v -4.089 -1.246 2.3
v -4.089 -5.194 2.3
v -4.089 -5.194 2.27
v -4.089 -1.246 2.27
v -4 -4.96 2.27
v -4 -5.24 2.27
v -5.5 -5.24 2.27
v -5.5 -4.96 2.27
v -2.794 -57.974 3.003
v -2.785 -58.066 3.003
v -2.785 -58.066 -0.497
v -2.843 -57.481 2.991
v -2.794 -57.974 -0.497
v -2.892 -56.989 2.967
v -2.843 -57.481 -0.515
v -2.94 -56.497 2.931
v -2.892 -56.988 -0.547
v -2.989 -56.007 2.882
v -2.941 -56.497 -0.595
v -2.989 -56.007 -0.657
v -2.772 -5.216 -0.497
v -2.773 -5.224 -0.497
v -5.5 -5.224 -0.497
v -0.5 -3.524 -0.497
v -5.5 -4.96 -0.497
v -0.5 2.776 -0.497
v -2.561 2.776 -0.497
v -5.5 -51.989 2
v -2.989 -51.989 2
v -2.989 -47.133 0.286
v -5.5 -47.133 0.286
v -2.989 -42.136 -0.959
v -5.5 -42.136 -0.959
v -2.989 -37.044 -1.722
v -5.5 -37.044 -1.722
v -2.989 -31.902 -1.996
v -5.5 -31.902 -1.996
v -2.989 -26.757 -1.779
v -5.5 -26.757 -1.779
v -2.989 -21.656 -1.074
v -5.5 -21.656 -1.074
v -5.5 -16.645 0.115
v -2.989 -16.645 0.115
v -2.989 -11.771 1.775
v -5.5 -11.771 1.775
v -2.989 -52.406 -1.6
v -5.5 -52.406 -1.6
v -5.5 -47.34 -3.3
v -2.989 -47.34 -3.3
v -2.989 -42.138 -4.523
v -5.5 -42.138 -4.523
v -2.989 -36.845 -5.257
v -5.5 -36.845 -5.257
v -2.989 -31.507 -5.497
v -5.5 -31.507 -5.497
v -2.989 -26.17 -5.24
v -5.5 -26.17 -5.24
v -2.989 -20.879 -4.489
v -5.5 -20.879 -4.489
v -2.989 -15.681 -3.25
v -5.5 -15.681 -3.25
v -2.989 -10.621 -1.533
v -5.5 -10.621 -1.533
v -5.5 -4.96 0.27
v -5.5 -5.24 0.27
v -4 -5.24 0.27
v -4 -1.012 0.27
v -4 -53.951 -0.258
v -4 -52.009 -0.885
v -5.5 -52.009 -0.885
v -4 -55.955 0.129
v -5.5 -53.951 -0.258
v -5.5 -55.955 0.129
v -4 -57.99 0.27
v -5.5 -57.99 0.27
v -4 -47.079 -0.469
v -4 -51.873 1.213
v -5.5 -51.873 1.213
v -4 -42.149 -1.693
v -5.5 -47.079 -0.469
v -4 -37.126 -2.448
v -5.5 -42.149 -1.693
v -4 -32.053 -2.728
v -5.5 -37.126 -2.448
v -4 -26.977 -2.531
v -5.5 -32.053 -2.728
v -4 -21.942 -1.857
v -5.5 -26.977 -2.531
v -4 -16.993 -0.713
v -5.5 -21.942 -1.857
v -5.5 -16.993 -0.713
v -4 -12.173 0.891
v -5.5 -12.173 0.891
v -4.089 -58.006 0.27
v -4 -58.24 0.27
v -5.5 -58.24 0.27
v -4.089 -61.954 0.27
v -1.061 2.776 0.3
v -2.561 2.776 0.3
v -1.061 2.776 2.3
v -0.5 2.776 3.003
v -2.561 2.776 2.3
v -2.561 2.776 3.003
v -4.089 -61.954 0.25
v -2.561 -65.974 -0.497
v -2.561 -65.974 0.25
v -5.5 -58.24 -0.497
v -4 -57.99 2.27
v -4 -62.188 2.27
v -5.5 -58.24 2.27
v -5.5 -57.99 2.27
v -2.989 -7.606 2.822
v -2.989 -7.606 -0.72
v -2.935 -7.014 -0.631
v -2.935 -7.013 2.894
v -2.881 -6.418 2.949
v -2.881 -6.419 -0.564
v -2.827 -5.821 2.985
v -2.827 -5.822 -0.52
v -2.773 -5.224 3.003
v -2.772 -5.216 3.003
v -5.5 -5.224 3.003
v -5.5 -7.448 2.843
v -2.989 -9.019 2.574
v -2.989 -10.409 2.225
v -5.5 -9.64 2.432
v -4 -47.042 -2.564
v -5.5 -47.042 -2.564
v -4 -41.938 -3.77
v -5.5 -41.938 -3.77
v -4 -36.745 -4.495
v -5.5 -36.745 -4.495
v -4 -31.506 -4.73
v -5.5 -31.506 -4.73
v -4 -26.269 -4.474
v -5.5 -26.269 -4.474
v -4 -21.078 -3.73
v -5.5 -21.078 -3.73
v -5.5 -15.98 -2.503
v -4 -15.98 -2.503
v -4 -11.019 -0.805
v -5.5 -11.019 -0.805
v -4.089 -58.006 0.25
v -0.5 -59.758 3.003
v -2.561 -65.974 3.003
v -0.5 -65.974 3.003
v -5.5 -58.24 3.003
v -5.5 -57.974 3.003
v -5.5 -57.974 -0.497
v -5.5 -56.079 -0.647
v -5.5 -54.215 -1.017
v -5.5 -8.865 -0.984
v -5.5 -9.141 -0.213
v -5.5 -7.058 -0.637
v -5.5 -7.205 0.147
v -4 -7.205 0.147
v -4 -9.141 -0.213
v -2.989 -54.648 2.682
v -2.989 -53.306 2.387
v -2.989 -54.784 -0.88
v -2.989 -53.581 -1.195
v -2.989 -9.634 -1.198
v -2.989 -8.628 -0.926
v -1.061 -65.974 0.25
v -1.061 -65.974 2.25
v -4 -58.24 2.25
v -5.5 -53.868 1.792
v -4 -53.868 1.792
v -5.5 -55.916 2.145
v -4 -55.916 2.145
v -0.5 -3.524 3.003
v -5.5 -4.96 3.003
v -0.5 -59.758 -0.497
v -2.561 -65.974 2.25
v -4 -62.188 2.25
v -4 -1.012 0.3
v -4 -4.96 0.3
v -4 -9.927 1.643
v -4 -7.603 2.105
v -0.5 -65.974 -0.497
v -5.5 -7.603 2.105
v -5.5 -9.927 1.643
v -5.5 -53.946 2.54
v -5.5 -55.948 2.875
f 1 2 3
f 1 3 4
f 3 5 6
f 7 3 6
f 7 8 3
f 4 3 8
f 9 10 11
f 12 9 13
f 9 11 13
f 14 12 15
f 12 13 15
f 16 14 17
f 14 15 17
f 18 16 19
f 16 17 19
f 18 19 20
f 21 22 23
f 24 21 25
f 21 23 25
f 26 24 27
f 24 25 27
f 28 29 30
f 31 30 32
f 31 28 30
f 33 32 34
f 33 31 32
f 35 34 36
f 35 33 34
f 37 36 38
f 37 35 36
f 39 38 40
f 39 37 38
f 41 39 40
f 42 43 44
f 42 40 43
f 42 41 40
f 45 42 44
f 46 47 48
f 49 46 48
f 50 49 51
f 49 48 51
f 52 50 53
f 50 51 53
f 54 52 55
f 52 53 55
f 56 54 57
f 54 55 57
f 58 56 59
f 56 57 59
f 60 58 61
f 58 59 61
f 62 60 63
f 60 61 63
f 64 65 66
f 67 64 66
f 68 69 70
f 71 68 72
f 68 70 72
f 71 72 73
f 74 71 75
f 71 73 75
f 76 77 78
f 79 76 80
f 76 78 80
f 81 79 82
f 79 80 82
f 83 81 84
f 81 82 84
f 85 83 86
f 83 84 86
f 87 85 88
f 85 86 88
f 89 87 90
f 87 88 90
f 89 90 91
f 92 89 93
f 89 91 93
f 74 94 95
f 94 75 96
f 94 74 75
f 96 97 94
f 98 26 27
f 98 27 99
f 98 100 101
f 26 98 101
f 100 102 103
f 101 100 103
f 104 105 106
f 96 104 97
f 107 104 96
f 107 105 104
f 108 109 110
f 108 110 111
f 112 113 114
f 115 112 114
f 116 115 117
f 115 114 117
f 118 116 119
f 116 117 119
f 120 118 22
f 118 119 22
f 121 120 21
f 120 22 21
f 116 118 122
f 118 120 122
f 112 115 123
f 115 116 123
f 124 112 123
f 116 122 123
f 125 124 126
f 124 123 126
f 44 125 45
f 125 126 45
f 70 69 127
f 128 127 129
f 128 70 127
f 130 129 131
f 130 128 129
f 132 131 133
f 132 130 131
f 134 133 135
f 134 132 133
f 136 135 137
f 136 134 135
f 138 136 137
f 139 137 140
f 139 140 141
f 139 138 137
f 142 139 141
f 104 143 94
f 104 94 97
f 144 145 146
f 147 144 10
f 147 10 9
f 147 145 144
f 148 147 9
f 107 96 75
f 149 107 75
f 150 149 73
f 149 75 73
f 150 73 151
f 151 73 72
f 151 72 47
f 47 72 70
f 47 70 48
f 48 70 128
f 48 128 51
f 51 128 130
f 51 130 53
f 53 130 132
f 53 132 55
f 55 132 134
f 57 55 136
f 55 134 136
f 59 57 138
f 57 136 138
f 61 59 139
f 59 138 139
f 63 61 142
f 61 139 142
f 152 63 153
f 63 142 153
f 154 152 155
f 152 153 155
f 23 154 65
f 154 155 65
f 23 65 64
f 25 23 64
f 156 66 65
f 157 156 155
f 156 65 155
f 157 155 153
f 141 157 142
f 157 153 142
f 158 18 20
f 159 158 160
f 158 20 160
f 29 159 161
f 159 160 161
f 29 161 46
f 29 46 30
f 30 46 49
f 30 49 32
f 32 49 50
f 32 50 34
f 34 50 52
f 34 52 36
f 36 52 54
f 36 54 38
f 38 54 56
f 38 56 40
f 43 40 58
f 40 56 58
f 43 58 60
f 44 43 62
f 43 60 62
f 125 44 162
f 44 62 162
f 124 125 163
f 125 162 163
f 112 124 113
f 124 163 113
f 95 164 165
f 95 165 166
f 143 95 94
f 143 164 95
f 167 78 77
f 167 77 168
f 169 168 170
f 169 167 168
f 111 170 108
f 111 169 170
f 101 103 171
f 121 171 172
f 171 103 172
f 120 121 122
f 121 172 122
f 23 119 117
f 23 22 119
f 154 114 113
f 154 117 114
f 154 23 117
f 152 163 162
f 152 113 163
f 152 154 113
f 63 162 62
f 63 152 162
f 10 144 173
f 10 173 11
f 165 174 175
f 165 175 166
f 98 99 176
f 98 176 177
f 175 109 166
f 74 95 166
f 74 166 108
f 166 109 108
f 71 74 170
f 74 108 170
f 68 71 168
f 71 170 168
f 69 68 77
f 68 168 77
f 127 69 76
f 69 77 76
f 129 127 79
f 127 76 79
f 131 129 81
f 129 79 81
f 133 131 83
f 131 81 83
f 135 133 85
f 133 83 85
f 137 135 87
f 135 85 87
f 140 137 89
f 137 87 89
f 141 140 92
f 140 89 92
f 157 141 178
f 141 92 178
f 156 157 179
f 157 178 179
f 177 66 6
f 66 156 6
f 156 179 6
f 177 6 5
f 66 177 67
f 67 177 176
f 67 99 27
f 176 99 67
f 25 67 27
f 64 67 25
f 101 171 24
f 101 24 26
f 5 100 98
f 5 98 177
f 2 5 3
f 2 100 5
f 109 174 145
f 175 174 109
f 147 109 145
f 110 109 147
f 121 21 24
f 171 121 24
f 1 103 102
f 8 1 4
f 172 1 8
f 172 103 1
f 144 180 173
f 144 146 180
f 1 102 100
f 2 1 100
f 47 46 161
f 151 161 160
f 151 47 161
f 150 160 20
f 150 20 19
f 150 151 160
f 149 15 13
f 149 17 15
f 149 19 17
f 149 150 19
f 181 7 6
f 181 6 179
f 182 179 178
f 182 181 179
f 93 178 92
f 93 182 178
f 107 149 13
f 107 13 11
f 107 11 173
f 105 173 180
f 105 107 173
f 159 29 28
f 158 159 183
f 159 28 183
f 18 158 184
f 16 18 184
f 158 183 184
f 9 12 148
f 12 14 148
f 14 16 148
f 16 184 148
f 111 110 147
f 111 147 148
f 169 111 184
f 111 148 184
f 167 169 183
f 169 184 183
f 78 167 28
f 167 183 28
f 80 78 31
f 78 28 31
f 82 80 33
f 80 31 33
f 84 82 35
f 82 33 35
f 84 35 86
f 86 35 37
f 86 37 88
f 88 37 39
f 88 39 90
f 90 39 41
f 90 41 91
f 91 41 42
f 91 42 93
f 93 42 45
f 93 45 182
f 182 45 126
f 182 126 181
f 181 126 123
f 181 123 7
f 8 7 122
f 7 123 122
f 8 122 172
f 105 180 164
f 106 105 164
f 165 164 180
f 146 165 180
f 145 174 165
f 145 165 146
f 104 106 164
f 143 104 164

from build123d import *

# Parameters (mm, degrees)
EXTRUDE064_DEPTH           = 5
EXTRUDE066_DEPTH           = 5
EXTRUDE066_PLACEMENT_ANGLE = 180
EXTRUDE065_DEPTH           = 2
EXTRUDE065_PLACEMENT_ANGLE = 180
EXTRUDE061_DEPTH           = 2
EXTRUDE063_DEPTH           = 3
EXTRUDE060_DEPTH           = 10
EXTRUDE057_DEPTH           = 5


with BuildPart() as extrude064:
    # Sketch039 → Extrude064 (new body)
    with BuildSketch(Plane.XY):
        Polygon((-0.523418, -66.073971), (-3.588769, -58.006004), (-3.588769, -66.073971), align=None)
    extrude(amount=EXTRUDE064_DEPTH)


with BuildPart() as extrude064_1:
    # Extrude064 placement: moved
    add(extrude064.part.moved(Location((-2, 0, -1))))


with BuildPart() as fusion056:
    # Sketch039 → Extrude066 (new body)
    with BuildSketch(Plane.XY):
        Polygon((-0.523418, -66.073971), (-3.588769, -58.006004), (-3.588769, -66.073971), align=None)
    extrude(amount=EXTRUDE066_DEPTH)


with BuildPart() as fusion056_1:
    # Extrude066 placement: moved
    add(fusion056.part.moved(Location((-2, -63.2, 3.5))).rotate(Axis((-2, -63.2, 3.5), (1, 0, 0)), EXTRUDE066_PLACEMENT_ANGLE))

    # Fusion056: union Extrude064
    add(extrude064_1.part)


with BuildPart() as extrude065:
    # Sketch037 → Extrude065 (new body)
    with BuildSketch(Plane.XY):
        Polygon((-0.523418, -66.073971), (-3.588769, -58.006004), (-3.588769, -66.073971), align=None)
    extrude(amount=EXTRUDE065_DEPTH)


with BuildPart() as extrude065_1:
    # Extrude065 placement: moved
    add(extrude065.part.moved(Location((-0.5, -63.2, 2.45))).rotate(Axis((-0.5, -63.2, 2.45), (1, 0, 0)), EXTRUDE065_PLACEMENT_ANGLE))


with BuildPart() as fusion055:
    # Sketch037 → Extrude061 (new body)
    with BuildSketch(Plane.XY):
        Polygon((-0.523418, -66.073971), (-3.588769, -58.006004), (-3.588769, -66.073971), align=None)
    extrude(amount=EXTRUDE061_DEPTH)


with BuildPart() as fusion055_1:
    # Extrude061 placement: moved
    add(fusion055.part.moved(Location((-0.5, 0, 0.4))))

    # Fusion055: union Extrude065
    add(extrude065_1.part)


with BuildPart() as extrude063:
    # Sketch038 → Extrude063 (new body)
    with BuildSketch(Plane.YZ):
        with BuildLine():
            ThreePointArc((-52.009312, -0.734582), (-31.50638, -4.580156), (-11.018523, -0.655055))
            ThreePointArc((-5.240026, 0.419738), (-8.178332, 0.146093), (-11.018523, -0.655055))
            Line((-5.240026, 0.419738), (2.759974, 0.419738))
            Line((2.759974, 0.419738), (2.759974, 2.419738))
            Line((2.759974, 2.419738), (-5.240026, 2.419738))
            ThreePointArc((-5.240026, 2.419738), (-8.772288, 2.061286), (-12.172965, 1.041109))
            ThreePointArc((-51.872542, 1.363439), (-32.05345, -2.578482), (-12.172965, 1.041109))
            ThreePointArc((-51.872542, 1.363439), (-54.88716, 2.147131), (-57.990026, 2.419738))
            Line((-65.990026, 2.419738), (-57.990026, 2.419738))
            Line((-65.990026, 0.419738), (-65.990026, 2.419738))
            Line((-57.990026, 0.419738), (-65.990026, 0.419738))
            ThreePointArc((-52.009312, -0.734582), (-54.946975, 0.115595), (-57.990026, 0.419738))
        make_face()
    extrude(amount=EXTRUDE063_DEPTH)


with BuildPart() as extrude063_1:
    # Extrude063 placement: moved
    add(extrude063.part.moved(Location((-7, 0, 0))))


with BuildPart() as extrude060:
    # Sketch036 → Extrude060 (new body)
    with BuildSketch(Plane.XY):
        Polygon((-0.489114, -59.765606), (-2.785057, -58.065606), (-2.989114, -56.006916), (-2.989114, -7.606139), (-2.772346, -5.215606), (-0.489114, -3.515606), align=None)
    extrude(amount=EXTRUDE060_DEPTH)


with BuildPart() as extrude060_1:
    # Extrude060 placement: moved
    add(extrude060.part.moved(Location((0, 0, -6))))


with BuildPart() as endverbindung:
    # Sketch033 → Extrude057 (new body)
    with BuildSketch(Plane.YZ):
        with BuildLine():
            ThreePointArc((-52.506138, -1.600172), (-31.607264, -5.496793), (-10.720935, -1.533483))
            ThreePointArc((-5.324033, -0.496866), (-8.066716, -0.784889), (-10.720935, -1.533483))
            Line((-5.324033, -0.496866), (2.675967, -0.496866))
            Line((2.675967, -0.496866), (2.675967, 3.003134))
            Line((2.675967, 3.003134), (-5.324033, 3.003134))
            ThreePointArc((-5.324033, 3.003134), (-8.649812, 2.668233), (-11.870907, 1.7752))
            ThreePointArc((-52.088632, 2.000492), (-32.001526, -1.996019), (-11.870907, 1.7752))
            ThreePointArc((-52.088632, 2.000492), (-55.042543, 2.733373), (-58.074033, 3.003134))
            Line((-66.074033, 3.003134), (-58.074033, 3.003134))
            Line((-66.074033, -0.496866), (-66.074033, 3.003134))
            Line((-58.074033, -0.496866), (-66.074033, -0.496866))
            ThreePointArc((-52.506138, -1.600172), (-55.241791, -0.804798), (-58.074033, -0.496866))
        make_face()
    extrude(amount=EXTRUDE057_DEPTH)


with BuildPart() as endverbindung_1:
    # Extrude057 placement: moved
    add(endverbindung.part.moved(Location((-5.5, 0.1, 0.15))))

    # Cut060: cut Extrude060
    add(extrude060_1.part, mode=Mode.SUBTRACT)

    # Cut061: cut Extrude063
    add(extrude063_1.part, mode=Mode.SUBTRACT)

    # Cut062: cut Fusion055
    add(fusion055_1.part, mode=Mode.SUBTRACT)

    # Cut063: cut Fusion056
    add(fusion056_1.part, mode=Mode.SUBTRACT)


with BuildPart() as endverbindung_2:
    # Cut063 placement: moved
    add(endverbindung_1.part.moved(Location((0, 0, -0.15))))


solid = endverbindung_2.part
